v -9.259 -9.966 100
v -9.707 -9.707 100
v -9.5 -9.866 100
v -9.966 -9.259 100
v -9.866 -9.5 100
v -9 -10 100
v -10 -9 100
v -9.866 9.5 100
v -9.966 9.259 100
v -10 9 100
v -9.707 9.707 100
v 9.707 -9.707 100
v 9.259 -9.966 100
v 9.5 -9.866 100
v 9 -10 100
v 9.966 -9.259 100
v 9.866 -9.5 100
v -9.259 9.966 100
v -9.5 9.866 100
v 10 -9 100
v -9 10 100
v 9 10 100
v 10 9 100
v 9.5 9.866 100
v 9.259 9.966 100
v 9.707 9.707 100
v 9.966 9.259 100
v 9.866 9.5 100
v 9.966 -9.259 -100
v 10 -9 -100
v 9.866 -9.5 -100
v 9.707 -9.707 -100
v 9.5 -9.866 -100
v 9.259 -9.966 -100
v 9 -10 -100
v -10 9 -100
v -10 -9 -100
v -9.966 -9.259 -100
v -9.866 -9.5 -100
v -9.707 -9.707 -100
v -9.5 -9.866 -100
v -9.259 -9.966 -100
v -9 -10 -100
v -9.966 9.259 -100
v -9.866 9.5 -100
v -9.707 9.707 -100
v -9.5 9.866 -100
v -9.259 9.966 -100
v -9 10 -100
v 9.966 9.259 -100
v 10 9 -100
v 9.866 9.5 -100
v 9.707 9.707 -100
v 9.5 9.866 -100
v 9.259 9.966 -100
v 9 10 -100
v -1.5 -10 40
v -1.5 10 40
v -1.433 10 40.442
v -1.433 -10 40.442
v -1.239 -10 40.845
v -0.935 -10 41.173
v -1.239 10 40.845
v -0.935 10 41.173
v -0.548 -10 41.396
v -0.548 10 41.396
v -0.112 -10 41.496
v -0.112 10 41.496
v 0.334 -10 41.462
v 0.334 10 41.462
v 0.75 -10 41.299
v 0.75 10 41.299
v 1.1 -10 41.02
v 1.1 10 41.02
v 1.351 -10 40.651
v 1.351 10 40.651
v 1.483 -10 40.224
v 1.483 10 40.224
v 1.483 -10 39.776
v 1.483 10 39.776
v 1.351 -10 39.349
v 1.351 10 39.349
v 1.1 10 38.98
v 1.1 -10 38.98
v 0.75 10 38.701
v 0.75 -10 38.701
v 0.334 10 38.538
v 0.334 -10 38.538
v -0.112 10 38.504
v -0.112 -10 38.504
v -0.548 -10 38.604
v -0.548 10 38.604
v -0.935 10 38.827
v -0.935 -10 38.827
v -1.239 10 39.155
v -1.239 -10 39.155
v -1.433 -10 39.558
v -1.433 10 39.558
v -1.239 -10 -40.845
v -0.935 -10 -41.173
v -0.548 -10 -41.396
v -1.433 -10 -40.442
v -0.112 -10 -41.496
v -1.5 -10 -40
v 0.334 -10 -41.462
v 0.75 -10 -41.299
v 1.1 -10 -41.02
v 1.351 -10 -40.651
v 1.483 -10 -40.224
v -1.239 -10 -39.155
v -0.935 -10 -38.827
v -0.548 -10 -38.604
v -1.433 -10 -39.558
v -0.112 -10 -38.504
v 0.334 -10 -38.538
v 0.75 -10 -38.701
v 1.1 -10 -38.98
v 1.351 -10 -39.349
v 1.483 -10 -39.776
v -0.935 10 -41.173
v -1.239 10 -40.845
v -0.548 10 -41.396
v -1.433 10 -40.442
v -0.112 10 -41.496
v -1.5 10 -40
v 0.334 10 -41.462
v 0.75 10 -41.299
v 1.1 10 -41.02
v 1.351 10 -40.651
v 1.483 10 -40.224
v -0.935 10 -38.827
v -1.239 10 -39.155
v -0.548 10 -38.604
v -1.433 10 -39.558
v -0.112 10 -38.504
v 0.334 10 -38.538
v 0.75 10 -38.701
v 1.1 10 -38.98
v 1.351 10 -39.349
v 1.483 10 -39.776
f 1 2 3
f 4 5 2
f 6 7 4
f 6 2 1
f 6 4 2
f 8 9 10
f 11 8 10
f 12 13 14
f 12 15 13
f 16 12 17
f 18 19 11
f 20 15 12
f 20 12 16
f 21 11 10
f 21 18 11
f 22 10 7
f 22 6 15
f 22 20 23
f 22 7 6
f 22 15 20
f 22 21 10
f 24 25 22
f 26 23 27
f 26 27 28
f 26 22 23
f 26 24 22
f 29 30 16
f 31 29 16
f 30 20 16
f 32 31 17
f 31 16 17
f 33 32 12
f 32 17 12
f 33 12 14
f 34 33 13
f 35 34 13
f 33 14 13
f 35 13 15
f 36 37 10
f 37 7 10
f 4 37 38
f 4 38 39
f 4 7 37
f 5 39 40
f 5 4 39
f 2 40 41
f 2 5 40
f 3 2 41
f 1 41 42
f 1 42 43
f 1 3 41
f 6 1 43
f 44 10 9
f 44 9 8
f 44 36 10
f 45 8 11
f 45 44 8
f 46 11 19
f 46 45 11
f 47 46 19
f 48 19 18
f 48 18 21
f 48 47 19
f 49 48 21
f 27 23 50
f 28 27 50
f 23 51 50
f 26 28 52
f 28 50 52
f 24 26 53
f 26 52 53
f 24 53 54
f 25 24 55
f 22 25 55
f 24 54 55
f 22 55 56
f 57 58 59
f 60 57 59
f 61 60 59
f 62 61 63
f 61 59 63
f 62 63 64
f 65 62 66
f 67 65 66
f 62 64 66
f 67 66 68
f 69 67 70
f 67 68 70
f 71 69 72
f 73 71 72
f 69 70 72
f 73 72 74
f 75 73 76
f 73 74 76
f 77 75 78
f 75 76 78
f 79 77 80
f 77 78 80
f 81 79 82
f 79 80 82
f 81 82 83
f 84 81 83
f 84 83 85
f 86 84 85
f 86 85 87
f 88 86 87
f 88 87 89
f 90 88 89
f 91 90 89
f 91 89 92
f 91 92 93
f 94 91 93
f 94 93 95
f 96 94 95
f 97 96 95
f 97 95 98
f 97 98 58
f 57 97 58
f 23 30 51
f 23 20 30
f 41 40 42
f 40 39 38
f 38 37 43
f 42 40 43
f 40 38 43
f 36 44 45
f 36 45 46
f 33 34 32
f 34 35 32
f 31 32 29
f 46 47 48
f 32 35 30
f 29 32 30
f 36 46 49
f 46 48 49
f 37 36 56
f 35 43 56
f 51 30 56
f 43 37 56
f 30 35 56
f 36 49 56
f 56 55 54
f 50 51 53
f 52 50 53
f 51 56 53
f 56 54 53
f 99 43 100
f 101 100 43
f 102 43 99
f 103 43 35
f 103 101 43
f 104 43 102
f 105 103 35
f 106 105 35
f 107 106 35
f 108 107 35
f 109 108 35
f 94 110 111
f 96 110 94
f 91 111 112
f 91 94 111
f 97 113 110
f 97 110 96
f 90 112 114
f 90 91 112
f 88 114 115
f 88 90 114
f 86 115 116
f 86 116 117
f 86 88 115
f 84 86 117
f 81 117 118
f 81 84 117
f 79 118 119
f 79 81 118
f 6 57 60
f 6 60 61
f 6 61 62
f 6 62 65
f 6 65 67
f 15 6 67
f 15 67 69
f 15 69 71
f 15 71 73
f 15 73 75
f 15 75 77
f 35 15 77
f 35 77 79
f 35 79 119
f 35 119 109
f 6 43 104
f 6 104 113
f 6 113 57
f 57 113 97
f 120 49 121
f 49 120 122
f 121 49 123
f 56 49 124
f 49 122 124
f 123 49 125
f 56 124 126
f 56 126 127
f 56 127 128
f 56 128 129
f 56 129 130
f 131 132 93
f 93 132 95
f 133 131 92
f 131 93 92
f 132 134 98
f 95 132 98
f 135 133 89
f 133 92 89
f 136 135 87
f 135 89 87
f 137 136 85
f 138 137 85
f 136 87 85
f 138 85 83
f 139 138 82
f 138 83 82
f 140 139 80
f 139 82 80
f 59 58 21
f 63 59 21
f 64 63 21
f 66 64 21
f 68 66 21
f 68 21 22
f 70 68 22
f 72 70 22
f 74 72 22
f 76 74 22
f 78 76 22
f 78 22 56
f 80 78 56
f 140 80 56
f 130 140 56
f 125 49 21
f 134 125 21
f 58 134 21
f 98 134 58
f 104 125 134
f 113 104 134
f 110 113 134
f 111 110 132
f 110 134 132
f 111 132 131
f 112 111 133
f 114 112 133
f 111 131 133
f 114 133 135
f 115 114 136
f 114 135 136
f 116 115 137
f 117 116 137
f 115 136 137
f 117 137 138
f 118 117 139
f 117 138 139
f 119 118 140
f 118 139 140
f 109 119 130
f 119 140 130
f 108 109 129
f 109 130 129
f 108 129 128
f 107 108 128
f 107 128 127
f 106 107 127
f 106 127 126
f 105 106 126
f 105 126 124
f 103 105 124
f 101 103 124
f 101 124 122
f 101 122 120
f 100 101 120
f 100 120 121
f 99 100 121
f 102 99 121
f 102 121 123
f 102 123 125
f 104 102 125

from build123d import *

# Parameters (mm, degrees)
SKETCH_1_W          = 20
SKETCH_1_H          = 20
EXTRUDE_1_DEPTH     = 100
FILLET_1_R          = 1
CUT_EXTRUDE_1_REACH = 104.47
SKETCH_2_R          = 1.5


with BuildPart() as part:
    # ｽｹｯﾁ1 → ﾎﾞｽ - 押し出し1 (new, symmetric)
    with BuildSketch(Plane.XY):
        Rectangle(SKETCH_1_W, SKETCH_1_H)
    extrude(amount=EXTRUDE_1_DEPTH, both=True)

    # ﾌｨﾚｯﾄ1
    fillet_1_edges = [part.edges().sort_by_distance(p)[0] for p in [
        (-10, 10, 0),
        (10, 10, 0),
        (10, -10, 0),
        (-10, -10, 0),
    ]]
    fillet(fillet_1_edges, radius=FILLET_1_R)

    # ｽｹｯﾁ2 → ｶｯﾄ - 押し出し1 (cut, up to next)
    with BuildSketch(Plane(origin=(0, 10, 0), x_dir=(1, 0, 0), z_dir=(0, 1, 0)), mode=Mode.PRIVATE) as cut_extrude_1_sk1:
        with Locations(Location((0, 40, 0), (0, 0, 180))):
            Circle(SKETCH_2_R)
    cut_extrude_1_tool1 = extrude(cut_extrude_1_sk1.sketch, amount=-CUT_EXTRUDE_1_REACH, mode=Mode.PRIVATE) & part.part
    # ｽｹｯﾁ2 → ｶｯﾄ - 押し出し1 (cut, up to next)
    with BuildSketch(Plane(origin=(0, 10, 0), x_dir=(1, 0, 0), z_dir=(0, 1, 0)), mode=Mode.PRIVATE) as cut_extrude_1_sk2:
        with Locations(Location((0, -40, 0), (0, 0, 180))):
            Circle(SKETCH_2_R)
    cut_extrude_1_tool2 = extrude(cut_extrude_1_sk2.sketch, amount=-CUT_EXTRUDE_1_REACH, mode=Mode.PRIVATE) & part.part
    add(cut_extrude_1_tool1.solids().sort_by_distance((0, 10, -40))[0], mode=Mode.SUBTRACT)
    add(cut_extrude_1_tool2.solids().sort_by_distance((0, 10, 40))[0], mode=Mode.SUBTRACT)


solid = part.part
